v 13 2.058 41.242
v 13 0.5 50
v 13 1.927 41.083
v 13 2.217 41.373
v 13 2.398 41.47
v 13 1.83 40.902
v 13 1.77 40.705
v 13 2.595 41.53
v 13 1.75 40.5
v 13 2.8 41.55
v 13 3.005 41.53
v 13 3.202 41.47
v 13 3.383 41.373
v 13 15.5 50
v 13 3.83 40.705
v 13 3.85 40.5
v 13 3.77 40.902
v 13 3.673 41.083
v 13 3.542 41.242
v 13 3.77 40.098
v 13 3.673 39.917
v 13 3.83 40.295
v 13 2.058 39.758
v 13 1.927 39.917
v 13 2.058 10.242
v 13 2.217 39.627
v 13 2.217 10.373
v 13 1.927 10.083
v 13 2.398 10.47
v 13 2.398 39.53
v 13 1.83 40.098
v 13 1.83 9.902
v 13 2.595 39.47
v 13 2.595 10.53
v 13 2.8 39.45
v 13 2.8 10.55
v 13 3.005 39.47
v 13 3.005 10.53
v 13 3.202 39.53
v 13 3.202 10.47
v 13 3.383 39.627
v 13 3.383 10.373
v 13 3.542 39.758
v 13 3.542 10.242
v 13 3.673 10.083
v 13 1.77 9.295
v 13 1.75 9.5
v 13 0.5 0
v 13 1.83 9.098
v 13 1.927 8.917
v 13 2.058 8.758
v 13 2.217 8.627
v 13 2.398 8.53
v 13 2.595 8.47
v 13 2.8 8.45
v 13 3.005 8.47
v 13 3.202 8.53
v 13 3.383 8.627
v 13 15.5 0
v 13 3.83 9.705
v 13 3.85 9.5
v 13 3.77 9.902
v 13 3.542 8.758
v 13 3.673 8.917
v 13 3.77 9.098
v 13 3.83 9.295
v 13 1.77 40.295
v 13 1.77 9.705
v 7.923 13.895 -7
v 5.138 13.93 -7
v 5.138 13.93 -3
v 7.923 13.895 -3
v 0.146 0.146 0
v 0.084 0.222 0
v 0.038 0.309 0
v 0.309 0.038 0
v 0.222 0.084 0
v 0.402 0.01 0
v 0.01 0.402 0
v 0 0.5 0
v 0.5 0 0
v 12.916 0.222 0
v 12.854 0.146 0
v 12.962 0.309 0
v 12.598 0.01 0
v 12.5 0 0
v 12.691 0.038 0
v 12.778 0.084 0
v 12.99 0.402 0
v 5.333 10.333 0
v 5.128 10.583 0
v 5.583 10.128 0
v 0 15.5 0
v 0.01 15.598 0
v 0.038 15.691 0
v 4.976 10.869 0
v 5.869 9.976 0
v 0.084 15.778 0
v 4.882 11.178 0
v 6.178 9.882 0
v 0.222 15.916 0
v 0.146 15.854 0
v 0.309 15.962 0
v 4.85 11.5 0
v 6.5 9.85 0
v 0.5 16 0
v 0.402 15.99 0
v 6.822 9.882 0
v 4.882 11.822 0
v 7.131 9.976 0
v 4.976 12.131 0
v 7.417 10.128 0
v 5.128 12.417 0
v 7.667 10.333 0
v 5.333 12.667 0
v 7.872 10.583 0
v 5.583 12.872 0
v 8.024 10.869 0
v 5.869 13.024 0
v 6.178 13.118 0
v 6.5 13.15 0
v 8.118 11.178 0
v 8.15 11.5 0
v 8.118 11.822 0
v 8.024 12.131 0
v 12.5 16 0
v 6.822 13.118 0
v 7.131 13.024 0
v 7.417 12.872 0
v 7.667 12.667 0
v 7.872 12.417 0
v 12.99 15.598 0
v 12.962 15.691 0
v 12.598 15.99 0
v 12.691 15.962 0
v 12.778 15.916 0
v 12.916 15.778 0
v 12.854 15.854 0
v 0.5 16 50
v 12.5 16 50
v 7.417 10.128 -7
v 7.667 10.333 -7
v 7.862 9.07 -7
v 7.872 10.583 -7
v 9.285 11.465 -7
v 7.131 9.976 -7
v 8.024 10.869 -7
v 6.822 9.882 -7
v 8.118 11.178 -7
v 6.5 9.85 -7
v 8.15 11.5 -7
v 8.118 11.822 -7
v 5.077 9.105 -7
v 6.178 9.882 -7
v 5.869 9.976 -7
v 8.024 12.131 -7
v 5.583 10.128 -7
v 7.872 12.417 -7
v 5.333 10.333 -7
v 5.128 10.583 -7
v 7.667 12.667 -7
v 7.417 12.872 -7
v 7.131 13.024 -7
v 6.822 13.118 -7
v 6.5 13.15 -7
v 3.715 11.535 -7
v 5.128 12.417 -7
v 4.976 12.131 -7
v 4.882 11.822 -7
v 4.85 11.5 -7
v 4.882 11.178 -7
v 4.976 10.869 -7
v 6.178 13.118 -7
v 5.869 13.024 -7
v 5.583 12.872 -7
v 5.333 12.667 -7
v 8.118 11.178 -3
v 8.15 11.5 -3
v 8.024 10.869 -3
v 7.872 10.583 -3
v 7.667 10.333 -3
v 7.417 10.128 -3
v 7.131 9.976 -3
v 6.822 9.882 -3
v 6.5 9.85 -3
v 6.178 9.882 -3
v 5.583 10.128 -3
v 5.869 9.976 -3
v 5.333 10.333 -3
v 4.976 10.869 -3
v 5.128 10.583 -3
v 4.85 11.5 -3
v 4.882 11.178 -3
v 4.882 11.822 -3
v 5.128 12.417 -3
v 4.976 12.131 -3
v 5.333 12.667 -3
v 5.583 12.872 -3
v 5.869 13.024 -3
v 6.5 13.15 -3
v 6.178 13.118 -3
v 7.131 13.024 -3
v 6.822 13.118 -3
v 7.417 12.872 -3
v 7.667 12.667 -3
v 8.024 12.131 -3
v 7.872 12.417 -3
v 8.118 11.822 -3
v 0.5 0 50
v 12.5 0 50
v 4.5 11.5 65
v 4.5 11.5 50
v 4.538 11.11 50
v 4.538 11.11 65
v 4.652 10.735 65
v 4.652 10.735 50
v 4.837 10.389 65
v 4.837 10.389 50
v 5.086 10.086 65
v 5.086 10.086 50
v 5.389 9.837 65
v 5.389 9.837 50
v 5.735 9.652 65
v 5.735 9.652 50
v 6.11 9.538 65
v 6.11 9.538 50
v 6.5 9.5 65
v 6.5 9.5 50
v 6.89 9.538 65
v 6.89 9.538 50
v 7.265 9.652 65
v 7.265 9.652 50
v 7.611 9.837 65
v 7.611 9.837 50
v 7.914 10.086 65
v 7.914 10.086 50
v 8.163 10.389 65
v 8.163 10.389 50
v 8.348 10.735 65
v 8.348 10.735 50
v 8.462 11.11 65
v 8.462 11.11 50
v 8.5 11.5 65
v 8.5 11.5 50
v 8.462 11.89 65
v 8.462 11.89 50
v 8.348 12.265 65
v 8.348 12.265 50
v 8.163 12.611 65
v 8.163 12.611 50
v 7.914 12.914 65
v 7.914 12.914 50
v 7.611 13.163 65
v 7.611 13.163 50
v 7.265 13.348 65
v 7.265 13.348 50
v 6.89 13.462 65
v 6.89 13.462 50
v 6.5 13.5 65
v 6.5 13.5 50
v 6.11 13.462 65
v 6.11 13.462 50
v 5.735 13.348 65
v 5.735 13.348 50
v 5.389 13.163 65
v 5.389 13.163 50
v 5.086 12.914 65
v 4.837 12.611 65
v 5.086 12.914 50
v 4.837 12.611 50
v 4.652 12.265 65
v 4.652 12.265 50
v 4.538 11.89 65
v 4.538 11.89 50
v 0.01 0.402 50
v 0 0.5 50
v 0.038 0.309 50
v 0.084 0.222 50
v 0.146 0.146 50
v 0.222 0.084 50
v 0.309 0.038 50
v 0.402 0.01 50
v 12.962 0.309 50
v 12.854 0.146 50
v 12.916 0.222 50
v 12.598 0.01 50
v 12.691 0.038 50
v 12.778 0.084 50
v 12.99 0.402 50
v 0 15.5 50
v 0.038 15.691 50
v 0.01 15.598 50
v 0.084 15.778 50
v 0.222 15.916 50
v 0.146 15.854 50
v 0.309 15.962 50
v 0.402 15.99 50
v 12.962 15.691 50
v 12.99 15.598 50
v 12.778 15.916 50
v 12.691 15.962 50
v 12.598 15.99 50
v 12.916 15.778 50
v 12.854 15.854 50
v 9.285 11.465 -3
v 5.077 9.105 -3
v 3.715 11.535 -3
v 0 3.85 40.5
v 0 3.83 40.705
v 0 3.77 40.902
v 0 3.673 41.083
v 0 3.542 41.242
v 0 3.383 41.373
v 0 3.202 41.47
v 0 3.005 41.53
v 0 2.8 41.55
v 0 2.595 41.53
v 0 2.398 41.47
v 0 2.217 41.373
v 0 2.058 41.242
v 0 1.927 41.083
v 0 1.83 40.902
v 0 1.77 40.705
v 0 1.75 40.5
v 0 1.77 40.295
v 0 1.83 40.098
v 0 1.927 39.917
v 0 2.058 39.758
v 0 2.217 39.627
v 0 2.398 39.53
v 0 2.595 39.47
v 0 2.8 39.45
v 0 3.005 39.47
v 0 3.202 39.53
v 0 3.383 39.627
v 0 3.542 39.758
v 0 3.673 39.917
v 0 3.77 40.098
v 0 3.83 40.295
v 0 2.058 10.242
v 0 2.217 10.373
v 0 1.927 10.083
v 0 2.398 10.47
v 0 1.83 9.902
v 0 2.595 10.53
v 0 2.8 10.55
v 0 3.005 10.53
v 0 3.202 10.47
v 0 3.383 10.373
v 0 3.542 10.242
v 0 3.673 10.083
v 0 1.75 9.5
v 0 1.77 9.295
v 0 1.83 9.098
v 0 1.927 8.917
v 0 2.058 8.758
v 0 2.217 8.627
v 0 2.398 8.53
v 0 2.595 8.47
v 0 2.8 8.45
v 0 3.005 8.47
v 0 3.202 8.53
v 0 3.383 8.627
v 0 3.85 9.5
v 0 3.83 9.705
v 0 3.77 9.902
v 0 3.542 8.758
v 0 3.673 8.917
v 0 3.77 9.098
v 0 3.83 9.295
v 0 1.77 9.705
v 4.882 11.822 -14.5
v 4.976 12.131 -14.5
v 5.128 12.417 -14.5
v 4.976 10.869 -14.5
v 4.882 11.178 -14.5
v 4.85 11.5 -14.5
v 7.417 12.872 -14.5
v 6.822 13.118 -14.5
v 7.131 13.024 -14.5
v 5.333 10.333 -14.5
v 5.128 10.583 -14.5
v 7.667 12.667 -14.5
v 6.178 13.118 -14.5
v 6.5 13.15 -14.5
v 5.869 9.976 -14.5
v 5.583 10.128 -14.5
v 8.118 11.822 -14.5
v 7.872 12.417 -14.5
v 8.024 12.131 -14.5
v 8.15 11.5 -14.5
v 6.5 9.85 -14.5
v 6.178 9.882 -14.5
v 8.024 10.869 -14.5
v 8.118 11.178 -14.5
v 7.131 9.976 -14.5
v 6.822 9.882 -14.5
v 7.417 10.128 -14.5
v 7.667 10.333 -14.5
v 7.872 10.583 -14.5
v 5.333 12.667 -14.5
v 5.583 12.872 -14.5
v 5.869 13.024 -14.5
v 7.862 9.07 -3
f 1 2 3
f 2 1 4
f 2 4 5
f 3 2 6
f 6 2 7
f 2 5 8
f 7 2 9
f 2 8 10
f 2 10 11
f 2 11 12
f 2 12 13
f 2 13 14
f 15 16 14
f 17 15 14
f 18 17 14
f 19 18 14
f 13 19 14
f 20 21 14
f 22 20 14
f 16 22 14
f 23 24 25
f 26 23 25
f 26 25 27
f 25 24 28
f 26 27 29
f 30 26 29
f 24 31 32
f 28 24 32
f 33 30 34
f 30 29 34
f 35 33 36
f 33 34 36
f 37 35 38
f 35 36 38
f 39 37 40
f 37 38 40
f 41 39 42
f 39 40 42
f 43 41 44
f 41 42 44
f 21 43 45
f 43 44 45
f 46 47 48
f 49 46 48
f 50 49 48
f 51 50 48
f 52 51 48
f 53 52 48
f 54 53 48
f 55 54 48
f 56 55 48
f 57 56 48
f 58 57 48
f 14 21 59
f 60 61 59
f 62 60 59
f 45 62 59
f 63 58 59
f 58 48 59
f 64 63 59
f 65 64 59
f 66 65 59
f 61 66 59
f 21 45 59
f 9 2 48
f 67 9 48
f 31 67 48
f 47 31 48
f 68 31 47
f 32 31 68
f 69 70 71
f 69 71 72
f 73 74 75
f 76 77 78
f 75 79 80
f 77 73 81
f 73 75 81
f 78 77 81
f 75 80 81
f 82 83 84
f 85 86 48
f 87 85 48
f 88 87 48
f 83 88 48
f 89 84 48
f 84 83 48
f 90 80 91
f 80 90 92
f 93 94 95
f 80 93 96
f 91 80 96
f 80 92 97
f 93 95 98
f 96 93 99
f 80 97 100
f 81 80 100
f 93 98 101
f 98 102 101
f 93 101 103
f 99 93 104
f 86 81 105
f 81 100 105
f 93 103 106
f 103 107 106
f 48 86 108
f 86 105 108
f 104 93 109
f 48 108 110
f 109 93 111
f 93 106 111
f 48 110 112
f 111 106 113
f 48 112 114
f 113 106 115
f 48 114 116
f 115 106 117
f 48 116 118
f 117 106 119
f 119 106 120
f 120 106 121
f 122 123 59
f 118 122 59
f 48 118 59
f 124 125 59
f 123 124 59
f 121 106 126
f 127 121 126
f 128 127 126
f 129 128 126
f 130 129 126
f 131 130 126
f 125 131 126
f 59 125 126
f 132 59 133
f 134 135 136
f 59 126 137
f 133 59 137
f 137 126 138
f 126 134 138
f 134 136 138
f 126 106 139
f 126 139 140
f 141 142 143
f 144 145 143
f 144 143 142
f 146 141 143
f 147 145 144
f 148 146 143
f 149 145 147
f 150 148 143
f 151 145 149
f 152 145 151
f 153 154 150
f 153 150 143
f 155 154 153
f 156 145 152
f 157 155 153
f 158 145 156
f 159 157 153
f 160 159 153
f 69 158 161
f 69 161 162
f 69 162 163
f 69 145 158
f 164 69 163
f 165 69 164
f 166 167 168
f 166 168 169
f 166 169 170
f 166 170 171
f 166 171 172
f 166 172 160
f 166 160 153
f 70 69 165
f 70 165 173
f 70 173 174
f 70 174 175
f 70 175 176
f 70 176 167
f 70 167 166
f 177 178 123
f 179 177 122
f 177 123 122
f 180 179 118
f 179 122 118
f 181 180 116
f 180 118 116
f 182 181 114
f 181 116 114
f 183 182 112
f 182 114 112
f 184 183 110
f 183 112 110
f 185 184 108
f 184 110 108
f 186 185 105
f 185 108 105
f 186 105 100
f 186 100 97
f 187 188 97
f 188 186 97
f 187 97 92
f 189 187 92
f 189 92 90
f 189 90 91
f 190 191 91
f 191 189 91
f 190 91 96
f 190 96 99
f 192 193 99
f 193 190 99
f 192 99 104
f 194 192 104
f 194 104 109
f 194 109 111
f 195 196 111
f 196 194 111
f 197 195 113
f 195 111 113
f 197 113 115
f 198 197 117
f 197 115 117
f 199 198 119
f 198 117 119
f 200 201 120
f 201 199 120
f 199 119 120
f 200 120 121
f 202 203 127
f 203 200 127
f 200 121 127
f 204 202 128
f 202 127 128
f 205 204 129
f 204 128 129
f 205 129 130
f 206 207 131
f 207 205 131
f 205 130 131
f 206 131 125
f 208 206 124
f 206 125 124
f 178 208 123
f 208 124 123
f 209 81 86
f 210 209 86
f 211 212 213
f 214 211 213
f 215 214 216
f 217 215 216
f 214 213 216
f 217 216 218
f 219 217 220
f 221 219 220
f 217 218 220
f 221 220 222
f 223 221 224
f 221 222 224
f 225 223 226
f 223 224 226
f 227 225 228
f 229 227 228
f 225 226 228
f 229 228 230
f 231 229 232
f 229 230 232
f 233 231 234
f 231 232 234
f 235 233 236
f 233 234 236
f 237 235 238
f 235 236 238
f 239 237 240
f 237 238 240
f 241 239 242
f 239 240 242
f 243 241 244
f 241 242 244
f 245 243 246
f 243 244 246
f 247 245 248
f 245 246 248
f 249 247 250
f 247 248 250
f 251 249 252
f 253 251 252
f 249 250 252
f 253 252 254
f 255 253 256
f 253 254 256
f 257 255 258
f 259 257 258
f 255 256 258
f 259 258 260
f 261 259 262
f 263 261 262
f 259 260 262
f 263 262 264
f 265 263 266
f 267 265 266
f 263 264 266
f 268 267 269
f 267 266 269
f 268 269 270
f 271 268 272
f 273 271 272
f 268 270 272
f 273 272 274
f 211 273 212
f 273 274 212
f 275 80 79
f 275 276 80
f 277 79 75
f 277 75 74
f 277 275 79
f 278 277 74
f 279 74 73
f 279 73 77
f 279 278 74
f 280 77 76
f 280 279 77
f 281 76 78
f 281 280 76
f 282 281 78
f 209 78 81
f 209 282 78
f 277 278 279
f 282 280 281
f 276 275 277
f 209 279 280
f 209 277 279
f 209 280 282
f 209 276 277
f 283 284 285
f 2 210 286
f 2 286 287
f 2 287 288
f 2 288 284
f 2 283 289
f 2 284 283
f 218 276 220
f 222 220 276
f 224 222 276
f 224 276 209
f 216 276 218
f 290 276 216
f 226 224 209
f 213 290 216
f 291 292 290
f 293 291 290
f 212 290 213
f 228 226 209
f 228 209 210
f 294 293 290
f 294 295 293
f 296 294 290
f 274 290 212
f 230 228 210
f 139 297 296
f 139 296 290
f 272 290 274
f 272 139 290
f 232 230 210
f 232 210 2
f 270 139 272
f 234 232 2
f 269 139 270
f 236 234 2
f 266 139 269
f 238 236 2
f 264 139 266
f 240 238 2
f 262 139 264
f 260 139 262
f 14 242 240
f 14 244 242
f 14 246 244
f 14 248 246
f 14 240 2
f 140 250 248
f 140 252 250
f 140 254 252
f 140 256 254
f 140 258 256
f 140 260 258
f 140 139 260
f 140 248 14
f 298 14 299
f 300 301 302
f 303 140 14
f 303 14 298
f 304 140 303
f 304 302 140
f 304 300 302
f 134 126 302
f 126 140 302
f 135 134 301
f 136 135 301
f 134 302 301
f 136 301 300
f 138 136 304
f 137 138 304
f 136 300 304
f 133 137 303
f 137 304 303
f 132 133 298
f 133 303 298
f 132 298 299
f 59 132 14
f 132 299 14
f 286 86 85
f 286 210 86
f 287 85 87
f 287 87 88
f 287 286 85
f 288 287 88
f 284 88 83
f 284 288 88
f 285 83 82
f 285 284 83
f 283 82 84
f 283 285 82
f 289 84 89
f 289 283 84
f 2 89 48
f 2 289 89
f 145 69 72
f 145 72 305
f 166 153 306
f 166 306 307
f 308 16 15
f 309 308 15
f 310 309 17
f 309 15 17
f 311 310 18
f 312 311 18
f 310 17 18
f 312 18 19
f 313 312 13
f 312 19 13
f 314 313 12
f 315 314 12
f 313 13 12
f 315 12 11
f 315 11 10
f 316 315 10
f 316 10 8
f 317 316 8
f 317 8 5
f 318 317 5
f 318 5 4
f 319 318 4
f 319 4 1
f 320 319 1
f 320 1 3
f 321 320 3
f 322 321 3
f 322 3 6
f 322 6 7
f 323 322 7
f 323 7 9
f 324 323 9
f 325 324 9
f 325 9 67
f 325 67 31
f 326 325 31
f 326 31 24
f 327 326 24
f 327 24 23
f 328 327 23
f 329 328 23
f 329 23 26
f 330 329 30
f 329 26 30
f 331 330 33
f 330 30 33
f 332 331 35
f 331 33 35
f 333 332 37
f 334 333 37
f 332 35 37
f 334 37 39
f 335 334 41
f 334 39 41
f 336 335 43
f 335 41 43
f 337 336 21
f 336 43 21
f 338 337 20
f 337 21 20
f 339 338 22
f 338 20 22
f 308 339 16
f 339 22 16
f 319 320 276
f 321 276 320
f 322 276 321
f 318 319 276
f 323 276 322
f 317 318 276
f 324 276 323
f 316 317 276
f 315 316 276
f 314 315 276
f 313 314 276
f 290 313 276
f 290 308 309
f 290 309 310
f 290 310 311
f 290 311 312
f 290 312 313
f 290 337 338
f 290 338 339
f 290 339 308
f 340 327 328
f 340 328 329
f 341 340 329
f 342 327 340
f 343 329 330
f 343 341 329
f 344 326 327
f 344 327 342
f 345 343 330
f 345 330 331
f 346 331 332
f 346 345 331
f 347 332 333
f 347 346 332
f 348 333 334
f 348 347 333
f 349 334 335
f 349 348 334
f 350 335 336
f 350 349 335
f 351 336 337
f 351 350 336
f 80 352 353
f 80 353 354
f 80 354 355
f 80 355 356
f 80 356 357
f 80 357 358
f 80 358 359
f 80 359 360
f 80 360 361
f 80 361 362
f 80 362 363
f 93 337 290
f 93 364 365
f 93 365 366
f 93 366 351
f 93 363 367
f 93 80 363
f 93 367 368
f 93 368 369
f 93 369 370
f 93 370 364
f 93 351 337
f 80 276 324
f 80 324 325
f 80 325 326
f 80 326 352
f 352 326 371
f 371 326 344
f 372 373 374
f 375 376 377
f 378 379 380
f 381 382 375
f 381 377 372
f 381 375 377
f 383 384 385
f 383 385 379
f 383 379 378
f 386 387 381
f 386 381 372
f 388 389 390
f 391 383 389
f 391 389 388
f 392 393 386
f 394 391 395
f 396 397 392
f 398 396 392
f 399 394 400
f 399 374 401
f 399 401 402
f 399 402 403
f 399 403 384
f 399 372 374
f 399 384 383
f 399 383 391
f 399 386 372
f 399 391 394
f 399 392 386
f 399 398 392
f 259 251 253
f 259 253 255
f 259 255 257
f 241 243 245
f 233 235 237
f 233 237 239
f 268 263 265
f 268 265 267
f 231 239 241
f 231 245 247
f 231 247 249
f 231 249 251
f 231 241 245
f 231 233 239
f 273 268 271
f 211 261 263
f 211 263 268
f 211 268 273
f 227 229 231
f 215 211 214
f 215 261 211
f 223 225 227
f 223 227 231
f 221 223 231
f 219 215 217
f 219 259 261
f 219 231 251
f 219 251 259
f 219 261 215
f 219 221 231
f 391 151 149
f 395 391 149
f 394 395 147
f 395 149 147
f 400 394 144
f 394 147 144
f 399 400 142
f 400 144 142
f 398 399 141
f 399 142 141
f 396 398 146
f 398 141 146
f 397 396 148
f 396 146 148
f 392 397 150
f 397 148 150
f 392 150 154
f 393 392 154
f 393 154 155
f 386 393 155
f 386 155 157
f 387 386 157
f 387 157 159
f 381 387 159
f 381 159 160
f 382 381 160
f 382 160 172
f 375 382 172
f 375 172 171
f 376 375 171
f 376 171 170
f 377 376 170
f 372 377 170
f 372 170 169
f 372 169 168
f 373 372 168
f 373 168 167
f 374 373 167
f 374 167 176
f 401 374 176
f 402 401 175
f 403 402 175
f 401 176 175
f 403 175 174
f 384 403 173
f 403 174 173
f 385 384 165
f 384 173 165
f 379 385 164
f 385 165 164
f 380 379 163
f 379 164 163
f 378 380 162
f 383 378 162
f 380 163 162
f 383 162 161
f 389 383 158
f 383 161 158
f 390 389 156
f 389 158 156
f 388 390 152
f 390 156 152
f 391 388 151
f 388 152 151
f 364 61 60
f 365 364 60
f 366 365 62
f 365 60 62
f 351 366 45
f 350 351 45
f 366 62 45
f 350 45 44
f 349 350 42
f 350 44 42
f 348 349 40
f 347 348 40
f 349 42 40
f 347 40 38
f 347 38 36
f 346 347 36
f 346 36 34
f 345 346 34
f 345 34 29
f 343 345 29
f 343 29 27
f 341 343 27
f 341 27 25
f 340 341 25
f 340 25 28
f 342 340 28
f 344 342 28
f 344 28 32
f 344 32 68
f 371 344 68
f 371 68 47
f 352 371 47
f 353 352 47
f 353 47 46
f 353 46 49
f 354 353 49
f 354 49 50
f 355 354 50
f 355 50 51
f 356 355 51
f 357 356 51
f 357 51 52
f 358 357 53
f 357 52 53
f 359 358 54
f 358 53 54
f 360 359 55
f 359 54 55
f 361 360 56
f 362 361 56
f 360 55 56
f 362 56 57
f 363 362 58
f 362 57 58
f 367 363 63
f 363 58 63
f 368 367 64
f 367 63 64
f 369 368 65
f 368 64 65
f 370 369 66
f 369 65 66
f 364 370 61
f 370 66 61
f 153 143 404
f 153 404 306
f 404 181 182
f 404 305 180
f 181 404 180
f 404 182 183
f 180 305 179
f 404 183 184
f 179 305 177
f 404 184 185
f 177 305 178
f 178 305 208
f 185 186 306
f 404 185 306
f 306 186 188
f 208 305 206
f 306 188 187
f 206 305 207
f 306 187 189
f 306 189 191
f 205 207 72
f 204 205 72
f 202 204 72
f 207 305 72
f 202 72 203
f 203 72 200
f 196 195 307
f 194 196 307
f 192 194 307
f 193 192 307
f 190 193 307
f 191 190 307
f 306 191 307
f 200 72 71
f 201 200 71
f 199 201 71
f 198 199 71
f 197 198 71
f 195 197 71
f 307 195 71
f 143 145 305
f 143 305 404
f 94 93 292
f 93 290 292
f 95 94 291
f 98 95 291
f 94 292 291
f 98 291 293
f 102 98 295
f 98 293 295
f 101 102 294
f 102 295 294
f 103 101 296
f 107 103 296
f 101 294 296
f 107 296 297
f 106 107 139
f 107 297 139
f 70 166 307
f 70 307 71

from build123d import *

# Parameters (mm, degrees)
SKETCH1_W           = 13
SKETCH1_H           = 16
BOSS_EXTRUDE1_DEPTH = 50
SKETCH2_R           = 1.05
CUT_EXTRUDE1_DEPTH  = 55.083269132
SKETCH3_R           = 2
BOSS_EXTRUDE2_DEPTH = 15
SKETCH4_R           = 1.65
BOSS_EXTRUDE3_DEPTH = 14.5
FILLET1_R           = 0.5
BOSS_EXTRUDE4_START = -7.5
BOSS_EXTRUDE4_DEPTH = 4


with BuildPart() as part:
    # Sketch1 → Boss-Extrude1 (new body)
    with BuildSketch(Plane.XY):
        with Locations((6.5, 8)):
            Rectangle(SKETCH1_W, SKETCH1_H)
    extrude(amount=BOSS_EXTRUDE1_DEPTH)

    # Sketch2 → Cut-Extrude1 (cut, through all)
    with BuildSketch(Plane(origin=(13, 0, 0), x_dir=(0, 0, -1), z_dir=(1, 0, 0))):
        with Locations(Location((-40.5, 2.8, 0), (0, 0, 90))):
            Circle(SKETCH2_R)
        with Locations(Location((-9.5, 2.8, 0), (0, 0, 90))):
            Circle(SKETCH2_R)
    extrude(amount=-CUT_EXTRUDE1_DEPTH, mode=Mode.SUBTRACT)

    # Sketch3 → Boss-Extrude2 (add)
    with BuildSketch(Plane.XY.offset(50)):
        with Locations(Location((6.5, 11.5, 0), (0, 0, 180))):
            Circle(SKETCH3_R)
    extrude(amount=BOSS_EXTRUDE2_DEPTH)

    # Sketch4 → Boss-Extrude3 (add)
    with BuildSketch(Plane(origin=(0, 0, 0), x_dir=(-1, 0, 0), z_dir=(0, 0, -1))):
        with Locations(Location((-6.5, 11.5, 0), (0, 0, 180))):
            Circle(SKETCH4_R)
    extrude(amount=BOSS_EXTRUDE3_DEPTH)

    # Fillet1
    fillet1_edges = [part.edges().sort_by_distance(p)[0] for p in [
        (0, 16, 25),
        (13, 16, 25),
        (13, 0, 25),
        (0, 0, 25),
    ]]
    fillet(fillet1_edges, radius=FILLET1_R)

    # Sketch6 → Boss-Extrude4 (add)
    with BuildSketch(Plane(origin=(0, 0, -14.5), x_dir=(-1, 0, 0), z_dir=(0, 0, -1)).offset(BOSS_EXTRUDE4_START)):
        Polygon((-7.86221417, 9.070311134), (-5.076934804, 9.10544349), (-3.714720633, 11.535132356), (-5.13778583, 13.929688866), (-7.923065196, 13.89455651), (-9.285279367, 11.464867644), align=None)
    extrude(amount=-BOSS_EXTRUDE4_DEPTH)


solid = part.part
